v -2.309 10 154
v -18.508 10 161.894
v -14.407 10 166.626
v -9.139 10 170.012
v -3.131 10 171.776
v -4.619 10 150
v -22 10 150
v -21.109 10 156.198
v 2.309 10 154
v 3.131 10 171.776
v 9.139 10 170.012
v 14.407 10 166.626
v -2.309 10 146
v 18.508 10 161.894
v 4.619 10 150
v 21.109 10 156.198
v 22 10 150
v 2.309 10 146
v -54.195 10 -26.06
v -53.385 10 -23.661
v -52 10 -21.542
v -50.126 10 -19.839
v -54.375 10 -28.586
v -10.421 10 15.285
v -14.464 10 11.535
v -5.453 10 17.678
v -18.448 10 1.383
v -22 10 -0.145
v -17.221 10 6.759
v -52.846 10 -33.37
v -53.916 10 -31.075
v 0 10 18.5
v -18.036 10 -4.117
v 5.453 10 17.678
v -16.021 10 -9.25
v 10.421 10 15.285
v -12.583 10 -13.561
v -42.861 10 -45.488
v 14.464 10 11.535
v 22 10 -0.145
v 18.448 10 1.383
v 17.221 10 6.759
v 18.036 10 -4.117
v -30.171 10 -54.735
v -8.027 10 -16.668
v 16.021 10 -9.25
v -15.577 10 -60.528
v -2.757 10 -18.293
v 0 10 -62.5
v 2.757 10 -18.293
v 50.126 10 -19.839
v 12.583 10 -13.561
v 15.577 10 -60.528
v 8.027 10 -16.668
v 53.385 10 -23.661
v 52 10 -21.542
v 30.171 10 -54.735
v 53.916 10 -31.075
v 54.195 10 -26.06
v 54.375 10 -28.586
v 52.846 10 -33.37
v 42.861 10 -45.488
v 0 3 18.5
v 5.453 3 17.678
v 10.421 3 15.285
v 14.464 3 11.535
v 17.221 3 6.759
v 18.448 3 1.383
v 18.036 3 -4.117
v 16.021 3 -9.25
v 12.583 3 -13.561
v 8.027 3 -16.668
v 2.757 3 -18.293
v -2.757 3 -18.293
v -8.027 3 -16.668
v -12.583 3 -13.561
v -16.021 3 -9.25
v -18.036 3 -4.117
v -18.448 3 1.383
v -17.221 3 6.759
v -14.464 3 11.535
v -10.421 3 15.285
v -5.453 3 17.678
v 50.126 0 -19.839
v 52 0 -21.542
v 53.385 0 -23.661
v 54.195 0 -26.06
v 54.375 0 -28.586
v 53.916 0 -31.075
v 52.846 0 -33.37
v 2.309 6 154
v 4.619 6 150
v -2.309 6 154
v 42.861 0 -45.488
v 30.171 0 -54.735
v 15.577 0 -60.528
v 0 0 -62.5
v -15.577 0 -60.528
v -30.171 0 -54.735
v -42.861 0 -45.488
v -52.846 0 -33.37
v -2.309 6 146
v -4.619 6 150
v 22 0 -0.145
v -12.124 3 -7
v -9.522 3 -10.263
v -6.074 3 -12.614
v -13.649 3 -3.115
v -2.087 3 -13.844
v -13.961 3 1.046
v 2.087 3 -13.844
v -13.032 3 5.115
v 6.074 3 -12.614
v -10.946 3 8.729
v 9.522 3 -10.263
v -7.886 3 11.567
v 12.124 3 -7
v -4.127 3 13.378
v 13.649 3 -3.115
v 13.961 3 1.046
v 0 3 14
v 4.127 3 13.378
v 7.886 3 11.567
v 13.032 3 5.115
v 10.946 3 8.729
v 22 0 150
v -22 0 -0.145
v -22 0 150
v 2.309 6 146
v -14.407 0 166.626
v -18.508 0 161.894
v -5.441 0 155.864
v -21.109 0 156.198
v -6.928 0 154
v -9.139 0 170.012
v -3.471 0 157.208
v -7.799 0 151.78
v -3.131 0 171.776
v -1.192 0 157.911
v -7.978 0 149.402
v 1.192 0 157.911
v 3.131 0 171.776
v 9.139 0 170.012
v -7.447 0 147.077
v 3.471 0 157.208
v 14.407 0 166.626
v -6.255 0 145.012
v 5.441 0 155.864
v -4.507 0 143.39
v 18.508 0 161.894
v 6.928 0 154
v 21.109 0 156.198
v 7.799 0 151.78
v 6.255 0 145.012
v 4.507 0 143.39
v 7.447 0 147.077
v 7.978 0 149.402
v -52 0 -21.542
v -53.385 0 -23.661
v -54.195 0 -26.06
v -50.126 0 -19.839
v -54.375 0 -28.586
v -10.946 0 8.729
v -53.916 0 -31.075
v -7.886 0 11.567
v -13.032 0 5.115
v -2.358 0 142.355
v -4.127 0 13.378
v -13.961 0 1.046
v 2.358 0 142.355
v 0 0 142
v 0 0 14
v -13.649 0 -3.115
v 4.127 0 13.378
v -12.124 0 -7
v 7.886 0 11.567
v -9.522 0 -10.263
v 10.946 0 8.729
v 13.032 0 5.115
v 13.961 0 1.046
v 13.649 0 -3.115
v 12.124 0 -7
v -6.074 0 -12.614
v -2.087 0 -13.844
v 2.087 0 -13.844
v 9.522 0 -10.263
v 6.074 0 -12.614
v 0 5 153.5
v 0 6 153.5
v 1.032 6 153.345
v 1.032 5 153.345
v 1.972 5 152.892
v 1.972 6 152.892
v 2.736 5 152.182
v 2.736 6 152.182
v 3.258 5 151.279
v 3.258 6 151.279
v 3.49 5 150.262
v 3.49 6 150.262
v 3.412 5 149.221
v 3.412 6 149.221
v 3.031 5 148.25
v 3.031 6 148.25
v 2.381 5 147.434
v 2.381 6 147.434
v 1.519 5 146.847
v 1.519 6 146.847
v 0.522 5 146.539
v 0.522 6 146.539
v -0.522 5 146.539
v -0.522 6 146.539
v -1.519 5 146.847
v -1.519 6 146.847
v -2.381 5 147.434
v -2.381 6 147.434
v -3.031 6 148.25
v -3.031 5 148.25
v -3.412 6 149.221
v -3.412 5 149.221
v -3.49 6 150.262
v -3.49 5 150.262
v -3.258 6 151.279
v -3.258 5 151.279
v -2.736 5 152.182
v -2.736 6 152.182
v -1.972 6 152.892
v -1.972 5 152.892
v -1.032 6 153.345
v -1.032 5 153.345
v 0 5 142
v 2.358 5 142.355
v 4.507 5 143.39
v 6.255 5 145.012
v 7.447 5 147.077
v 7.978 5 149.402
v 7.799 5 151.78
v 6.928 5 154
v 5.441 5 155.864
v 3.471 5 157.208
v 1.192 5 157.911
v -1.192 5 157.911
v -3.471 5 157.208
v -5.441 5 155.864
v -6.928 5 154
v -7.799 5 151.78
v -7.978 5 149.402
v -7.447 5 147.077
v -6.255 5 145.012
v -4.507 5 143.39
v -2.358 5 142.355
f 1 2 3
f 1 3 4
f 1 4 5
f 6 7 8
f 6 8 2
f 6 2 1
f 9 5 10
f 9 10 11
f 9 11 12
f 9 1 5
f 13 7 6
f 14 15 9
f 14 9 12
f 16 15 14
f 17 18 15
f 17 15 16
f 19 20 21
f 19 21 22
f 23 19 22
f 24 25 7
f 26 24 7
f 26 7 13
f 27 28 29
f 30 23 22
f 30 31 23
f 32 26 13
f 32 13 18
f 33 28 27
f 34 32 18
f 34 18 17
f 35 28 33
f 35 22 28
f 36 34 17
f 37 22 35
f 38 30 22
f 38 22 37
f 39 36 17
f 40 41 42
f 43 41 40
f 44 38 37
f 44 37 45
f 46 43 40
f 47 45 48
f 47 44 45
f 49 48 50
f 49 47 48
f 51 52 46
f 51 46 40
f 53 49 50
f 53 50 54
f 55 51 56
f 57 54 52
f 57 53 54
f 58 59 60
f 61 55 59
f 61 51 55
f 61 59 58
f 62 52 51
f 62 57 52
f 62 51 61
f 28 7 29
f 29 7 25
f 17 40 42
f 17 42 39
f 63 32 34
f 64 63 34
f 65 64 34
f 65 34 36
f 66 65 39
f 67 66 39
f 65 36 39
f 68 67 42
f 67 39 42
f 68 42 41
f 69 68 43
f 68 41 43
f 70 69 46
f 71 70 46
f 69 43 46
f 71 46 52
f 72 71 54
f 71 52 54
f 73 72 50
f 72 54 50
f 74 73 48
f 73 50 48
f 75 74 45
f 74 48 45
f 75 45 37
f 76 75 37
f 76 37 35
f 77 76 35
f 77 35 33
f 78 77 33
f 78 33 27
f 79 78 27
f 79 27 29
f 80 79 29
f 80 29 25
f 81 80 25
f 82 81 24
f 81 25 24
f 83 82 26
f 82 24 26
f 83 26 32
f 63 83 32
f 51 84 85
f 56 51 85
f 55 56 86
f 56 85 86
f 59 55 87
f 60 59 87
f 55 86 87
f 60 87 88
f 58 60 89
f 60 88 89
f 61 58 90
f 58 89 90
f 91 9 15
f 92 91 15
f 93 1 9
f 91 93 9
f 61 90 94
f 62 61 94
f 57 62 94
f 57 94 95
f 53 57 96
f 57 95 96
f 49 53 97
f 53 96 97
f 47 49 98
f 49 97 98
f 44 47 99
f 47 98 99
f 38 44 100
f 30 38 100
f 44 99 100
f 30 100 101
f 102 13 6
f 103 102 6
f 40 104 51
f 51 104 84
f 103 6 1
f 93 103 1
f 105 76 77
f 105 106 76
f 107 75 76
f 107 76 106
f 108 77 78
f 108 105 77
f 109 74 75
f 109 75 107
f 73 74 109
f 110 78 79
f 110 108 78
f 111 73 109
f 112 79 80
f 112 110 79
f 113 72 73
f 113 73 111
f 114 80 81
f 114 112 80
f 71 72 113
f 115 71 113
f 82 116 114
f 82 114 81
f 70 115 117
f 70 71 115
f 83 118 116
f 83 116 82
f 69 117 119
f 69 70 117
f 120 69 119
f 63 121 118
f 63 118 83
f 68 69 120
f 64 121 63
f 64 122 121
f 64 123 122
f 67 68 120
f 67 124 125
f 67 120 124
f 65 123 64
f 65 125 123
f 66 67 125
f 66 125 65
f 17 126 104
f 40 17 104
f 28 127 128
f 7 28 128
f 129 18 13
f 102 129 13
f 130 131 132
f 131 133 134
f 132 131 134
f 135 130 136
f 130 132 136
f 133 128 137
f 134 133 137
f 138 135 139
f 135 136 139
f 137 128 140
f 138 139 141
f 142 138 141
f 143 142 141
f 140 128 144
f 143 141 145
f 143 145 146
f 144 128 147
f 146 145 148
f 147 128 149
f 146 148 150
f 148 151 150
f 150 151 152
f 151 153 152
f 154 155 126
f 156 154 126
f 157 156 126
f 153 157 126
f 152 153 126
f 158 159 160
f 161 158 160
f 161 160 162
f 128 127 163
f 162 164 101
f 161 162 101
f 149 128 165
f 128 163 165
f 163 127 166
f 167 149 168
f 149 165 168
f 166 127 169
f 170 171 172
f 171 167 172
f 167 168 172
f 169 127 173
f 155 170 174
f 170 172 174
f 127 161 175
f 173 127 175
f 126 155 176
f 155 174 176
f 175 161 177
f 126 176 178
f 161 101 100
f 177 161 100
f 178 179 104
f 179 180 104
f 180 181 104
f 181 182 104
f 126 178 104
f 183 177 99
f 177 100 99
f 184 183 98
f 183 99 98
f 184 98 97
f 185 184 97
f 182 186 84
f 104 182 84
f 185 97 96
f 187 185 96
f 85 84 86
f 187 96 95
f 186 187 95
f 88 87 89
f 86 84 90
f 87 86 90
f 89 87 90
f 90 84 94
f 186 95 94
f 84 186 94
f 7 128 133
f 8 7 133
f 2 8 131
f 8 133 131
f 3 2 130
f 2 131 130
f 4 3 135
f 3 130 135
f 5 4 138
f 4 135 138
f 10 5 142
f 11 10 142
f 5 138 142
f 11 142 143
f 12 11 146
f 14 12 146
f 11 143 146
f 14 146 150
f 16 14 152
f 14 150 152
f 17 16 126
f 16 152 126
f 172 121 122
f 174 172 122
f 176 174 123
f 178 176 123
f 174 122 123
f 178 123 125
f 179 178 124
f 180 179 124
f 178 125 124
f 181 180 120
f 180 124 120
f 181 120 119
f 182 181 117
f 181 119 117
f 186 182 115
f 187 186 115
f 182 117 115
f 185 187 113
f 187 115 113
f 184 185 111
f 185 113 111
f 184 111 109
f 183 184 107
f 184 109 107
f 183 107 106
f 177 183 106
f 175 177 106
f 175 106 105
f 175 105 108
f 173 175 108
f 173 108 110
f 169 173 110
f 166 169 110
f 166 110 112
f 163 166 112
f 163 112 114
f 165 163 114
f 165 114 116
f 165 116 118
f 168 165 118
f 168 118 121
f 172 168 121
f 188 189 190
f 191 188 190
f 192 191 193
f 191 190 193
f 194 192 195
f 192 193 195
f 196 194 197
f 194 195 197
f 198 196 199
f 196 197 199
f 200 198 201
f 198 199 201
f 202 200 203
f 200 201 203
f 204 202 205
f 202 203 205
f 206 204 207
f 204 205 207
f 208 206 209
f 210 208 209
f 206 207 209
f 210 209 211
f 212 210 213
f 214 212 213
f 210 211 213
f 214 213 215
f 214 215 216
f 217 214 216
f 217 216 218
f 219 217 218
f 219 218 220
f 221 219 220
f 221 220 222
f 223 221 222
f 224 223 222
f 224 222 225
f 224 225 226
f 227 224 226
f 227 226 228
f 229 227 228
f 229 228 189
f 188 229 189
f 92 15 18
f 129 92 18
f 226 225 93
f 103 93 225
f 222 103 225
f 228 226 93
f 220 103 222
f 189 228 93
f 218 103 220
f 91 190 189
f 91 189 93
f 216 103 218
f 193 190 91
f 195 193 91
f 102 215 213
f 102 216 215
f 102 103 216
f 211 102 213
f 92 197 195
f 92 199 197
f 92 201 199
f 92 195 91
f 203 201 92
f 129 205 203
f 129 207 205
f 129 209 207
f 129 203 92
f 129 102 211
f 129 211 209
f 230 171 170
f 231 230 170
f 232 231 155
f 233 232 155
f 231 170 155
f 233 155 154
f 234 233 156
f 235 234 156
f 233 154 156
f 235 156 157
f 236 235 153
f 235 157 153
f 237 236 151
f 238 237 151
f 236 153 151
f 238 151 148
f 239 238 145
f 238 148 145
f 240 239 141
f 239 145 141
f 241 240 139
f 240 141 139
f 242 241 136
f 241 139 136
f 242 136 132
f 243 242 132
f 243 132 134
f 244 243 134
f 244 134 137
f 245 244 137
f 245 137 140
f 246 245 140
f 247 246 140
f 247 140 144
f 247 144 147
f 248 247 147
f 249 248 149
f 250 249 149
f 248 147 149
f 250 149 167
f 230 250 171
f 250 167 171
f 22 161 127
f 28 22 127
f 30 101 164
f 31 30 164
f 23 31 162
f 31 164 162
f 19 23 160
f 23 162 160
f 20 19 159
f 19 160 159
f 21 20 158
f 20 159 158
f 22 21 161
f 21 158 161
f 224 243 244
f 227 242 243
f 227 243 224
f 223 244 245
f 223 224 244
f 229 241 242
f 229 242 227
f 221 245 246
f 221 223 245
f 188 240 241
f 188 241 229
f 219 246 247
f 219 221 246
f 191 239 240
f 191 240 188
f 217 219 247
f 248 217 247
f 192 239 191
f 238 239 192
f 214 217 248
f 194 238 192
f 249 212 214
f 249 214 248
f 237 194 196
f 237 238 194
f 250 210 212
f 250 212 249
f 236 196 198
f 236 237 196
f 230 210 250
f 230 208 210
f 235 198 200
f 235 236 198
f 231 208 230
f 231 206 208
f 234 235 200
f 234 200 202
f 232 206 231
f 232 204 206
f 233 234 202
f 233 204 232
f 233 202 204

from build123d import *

# Parameters (mm, degrees)
BOSS_EXTRUDE1_DEPTH = 10
BOSS_EXTRUDE2_DEPTH = 10
SKETCH3_R           = 18.5
CUT_EXTRUDE1_DEPTH  = 7
SKETCH4_R           = 14
CUT_EXTRUDE2_DEPTH  = 181.671916356
SKETCH5_R           = 3.5
CUT_EXTRUDE3_DEPTH  = 181.671916356
SKETCH6_R           = 8
CUT_EXTRUDE4_DEPTH  = 5
CUT_EXTRUDE5_DEPTH  = 4


with BuildPart() as part:
    # Sketch1 → Boss-Extrude1 (new body)
    with BuildSketch(Plane(origin=(0, 0, 0), x_dir=(1, 0, 0), z_dir=(0, 1, 0))):
        with BuildLine():
            Line((-50.126401057, 19.839201524), (-7.169705454, -10.239400554))
            ThreePointArc((-7.169705454, -10.239400554), (0, -12.5), (7.169705454, -10.239400554))
            Line((7.169705454, -10.239400554), (50.126401057, 19.839201524))
            ThreePointArc((50.126401057, 19.839201524), (54.194564303, 26.060188175), (52.845996063, 33.369907103))
            ThreePointArc((52.845996063, 33.369907103), (0, 62.5), (-52.845996063, 33.369907103))
            ThreePointArc((-52.845996063, 33.369907103), (-54.194564303, 26.060188175), (-50.126401057, 19.839201524))
        make_face()
    extrude(amount=BOSS_EXTRUDE1_DEPTH)

    # Sketch2 → Boss-Extrude2 (add)
    with BuildSketch(Plane(origin=(0, 0, 0), x_dir=(1, 0, 0), z_dir=(0, 1, 0))):
        with BuildLine():
            Line((-22, 0.144883481), (-22, -150))
            ThreePointArc((-22, -150), (0, -172), (22, -150))
            Line((22, -150), (22, 0.144883481))
            Line((22, 0.144883481), (7.169705454, -10.239400554))
            ThreePointArc((7.169705454, -10.239400554), (0, -12.5), (-7.169705454, -10.239400554))
            Line((-7.169705454, -10.239400554), (-22, 0.144883481))
        make_face()
    extrude(amount=BOSS_EXTRUDE2_DEPTH)

    # Sketch3 → Cut-Extrude1 (cut)
    with BuildSketch(Plane(origin=(0, 10, 0), x_dir=(1, 0, 0), z_dir=(0, 1, 0))):
        with Locations(Location((0, 0, 0), (0, 0, 270))):
            Circle(SKETCH3_R)
    extrude(amount=-CUT_EXTRUDE1_DEPTH, mode=Mode.SUBTRACT)

    # Sketch4 → Cut-Extrude2 (cut, through all)
    with BuildSketch(Plane(origin=(0, 10, 0), x_dir=(1, 0, 0), z_dir=(0, 1, 0))):
        with Locations(Location((0, 0, 0), (0, 0, 270))):
            Circle(SKETCH4_R)
    extrude(amount=-CUT_EXTRUDE2_DEPTH, mode=Mode.SUBTRACT)

    # Sketch5 → Cut-Extrude3 (cut, through all)
    with BuildSketch(Plane(origin=(0, 10, 0), x_dir=(1, 0, 0), z_dir=(0, 1, 0))):
        with Locations(Location((0, -150, 0), (0, 0, 270))):
            Circle(SKETCH5_R)
    extrude(amount=-CUT_EXTRUDE3_DEPTH, mode=Mode.SUBTRACT)

    # Sketch6 → Cut-Extrude4 (cut)
    with BuildSketch(Plane.XZ):
        with Locations(Location((0, 150, 0), (0, 0, 270))):
            Circle(SKETCH6_R)
    extrude(amount=-CUT_EXTRUDE4_DEPTH, mode=Mode.SUBTRACT)

    # Sketch7 → Cut-Extrude5 (cut)
    with BuildSketch(Plane(origin=(0, 10, 0), x_dir=(1, 0, 0), z_dir=(0, 1, 0))):
        Polygon((4.618802154, -150), (2.309401077, -146), (-2.309401077, -146), (-4.618802154, -150), (-2.309401077, -154), (2.309401077, -154), align=None)
    extrude(amount=-CUT_EXTRUDE5_DEPTH, mode=Mode.SUBTRACT)


solid = part.part
